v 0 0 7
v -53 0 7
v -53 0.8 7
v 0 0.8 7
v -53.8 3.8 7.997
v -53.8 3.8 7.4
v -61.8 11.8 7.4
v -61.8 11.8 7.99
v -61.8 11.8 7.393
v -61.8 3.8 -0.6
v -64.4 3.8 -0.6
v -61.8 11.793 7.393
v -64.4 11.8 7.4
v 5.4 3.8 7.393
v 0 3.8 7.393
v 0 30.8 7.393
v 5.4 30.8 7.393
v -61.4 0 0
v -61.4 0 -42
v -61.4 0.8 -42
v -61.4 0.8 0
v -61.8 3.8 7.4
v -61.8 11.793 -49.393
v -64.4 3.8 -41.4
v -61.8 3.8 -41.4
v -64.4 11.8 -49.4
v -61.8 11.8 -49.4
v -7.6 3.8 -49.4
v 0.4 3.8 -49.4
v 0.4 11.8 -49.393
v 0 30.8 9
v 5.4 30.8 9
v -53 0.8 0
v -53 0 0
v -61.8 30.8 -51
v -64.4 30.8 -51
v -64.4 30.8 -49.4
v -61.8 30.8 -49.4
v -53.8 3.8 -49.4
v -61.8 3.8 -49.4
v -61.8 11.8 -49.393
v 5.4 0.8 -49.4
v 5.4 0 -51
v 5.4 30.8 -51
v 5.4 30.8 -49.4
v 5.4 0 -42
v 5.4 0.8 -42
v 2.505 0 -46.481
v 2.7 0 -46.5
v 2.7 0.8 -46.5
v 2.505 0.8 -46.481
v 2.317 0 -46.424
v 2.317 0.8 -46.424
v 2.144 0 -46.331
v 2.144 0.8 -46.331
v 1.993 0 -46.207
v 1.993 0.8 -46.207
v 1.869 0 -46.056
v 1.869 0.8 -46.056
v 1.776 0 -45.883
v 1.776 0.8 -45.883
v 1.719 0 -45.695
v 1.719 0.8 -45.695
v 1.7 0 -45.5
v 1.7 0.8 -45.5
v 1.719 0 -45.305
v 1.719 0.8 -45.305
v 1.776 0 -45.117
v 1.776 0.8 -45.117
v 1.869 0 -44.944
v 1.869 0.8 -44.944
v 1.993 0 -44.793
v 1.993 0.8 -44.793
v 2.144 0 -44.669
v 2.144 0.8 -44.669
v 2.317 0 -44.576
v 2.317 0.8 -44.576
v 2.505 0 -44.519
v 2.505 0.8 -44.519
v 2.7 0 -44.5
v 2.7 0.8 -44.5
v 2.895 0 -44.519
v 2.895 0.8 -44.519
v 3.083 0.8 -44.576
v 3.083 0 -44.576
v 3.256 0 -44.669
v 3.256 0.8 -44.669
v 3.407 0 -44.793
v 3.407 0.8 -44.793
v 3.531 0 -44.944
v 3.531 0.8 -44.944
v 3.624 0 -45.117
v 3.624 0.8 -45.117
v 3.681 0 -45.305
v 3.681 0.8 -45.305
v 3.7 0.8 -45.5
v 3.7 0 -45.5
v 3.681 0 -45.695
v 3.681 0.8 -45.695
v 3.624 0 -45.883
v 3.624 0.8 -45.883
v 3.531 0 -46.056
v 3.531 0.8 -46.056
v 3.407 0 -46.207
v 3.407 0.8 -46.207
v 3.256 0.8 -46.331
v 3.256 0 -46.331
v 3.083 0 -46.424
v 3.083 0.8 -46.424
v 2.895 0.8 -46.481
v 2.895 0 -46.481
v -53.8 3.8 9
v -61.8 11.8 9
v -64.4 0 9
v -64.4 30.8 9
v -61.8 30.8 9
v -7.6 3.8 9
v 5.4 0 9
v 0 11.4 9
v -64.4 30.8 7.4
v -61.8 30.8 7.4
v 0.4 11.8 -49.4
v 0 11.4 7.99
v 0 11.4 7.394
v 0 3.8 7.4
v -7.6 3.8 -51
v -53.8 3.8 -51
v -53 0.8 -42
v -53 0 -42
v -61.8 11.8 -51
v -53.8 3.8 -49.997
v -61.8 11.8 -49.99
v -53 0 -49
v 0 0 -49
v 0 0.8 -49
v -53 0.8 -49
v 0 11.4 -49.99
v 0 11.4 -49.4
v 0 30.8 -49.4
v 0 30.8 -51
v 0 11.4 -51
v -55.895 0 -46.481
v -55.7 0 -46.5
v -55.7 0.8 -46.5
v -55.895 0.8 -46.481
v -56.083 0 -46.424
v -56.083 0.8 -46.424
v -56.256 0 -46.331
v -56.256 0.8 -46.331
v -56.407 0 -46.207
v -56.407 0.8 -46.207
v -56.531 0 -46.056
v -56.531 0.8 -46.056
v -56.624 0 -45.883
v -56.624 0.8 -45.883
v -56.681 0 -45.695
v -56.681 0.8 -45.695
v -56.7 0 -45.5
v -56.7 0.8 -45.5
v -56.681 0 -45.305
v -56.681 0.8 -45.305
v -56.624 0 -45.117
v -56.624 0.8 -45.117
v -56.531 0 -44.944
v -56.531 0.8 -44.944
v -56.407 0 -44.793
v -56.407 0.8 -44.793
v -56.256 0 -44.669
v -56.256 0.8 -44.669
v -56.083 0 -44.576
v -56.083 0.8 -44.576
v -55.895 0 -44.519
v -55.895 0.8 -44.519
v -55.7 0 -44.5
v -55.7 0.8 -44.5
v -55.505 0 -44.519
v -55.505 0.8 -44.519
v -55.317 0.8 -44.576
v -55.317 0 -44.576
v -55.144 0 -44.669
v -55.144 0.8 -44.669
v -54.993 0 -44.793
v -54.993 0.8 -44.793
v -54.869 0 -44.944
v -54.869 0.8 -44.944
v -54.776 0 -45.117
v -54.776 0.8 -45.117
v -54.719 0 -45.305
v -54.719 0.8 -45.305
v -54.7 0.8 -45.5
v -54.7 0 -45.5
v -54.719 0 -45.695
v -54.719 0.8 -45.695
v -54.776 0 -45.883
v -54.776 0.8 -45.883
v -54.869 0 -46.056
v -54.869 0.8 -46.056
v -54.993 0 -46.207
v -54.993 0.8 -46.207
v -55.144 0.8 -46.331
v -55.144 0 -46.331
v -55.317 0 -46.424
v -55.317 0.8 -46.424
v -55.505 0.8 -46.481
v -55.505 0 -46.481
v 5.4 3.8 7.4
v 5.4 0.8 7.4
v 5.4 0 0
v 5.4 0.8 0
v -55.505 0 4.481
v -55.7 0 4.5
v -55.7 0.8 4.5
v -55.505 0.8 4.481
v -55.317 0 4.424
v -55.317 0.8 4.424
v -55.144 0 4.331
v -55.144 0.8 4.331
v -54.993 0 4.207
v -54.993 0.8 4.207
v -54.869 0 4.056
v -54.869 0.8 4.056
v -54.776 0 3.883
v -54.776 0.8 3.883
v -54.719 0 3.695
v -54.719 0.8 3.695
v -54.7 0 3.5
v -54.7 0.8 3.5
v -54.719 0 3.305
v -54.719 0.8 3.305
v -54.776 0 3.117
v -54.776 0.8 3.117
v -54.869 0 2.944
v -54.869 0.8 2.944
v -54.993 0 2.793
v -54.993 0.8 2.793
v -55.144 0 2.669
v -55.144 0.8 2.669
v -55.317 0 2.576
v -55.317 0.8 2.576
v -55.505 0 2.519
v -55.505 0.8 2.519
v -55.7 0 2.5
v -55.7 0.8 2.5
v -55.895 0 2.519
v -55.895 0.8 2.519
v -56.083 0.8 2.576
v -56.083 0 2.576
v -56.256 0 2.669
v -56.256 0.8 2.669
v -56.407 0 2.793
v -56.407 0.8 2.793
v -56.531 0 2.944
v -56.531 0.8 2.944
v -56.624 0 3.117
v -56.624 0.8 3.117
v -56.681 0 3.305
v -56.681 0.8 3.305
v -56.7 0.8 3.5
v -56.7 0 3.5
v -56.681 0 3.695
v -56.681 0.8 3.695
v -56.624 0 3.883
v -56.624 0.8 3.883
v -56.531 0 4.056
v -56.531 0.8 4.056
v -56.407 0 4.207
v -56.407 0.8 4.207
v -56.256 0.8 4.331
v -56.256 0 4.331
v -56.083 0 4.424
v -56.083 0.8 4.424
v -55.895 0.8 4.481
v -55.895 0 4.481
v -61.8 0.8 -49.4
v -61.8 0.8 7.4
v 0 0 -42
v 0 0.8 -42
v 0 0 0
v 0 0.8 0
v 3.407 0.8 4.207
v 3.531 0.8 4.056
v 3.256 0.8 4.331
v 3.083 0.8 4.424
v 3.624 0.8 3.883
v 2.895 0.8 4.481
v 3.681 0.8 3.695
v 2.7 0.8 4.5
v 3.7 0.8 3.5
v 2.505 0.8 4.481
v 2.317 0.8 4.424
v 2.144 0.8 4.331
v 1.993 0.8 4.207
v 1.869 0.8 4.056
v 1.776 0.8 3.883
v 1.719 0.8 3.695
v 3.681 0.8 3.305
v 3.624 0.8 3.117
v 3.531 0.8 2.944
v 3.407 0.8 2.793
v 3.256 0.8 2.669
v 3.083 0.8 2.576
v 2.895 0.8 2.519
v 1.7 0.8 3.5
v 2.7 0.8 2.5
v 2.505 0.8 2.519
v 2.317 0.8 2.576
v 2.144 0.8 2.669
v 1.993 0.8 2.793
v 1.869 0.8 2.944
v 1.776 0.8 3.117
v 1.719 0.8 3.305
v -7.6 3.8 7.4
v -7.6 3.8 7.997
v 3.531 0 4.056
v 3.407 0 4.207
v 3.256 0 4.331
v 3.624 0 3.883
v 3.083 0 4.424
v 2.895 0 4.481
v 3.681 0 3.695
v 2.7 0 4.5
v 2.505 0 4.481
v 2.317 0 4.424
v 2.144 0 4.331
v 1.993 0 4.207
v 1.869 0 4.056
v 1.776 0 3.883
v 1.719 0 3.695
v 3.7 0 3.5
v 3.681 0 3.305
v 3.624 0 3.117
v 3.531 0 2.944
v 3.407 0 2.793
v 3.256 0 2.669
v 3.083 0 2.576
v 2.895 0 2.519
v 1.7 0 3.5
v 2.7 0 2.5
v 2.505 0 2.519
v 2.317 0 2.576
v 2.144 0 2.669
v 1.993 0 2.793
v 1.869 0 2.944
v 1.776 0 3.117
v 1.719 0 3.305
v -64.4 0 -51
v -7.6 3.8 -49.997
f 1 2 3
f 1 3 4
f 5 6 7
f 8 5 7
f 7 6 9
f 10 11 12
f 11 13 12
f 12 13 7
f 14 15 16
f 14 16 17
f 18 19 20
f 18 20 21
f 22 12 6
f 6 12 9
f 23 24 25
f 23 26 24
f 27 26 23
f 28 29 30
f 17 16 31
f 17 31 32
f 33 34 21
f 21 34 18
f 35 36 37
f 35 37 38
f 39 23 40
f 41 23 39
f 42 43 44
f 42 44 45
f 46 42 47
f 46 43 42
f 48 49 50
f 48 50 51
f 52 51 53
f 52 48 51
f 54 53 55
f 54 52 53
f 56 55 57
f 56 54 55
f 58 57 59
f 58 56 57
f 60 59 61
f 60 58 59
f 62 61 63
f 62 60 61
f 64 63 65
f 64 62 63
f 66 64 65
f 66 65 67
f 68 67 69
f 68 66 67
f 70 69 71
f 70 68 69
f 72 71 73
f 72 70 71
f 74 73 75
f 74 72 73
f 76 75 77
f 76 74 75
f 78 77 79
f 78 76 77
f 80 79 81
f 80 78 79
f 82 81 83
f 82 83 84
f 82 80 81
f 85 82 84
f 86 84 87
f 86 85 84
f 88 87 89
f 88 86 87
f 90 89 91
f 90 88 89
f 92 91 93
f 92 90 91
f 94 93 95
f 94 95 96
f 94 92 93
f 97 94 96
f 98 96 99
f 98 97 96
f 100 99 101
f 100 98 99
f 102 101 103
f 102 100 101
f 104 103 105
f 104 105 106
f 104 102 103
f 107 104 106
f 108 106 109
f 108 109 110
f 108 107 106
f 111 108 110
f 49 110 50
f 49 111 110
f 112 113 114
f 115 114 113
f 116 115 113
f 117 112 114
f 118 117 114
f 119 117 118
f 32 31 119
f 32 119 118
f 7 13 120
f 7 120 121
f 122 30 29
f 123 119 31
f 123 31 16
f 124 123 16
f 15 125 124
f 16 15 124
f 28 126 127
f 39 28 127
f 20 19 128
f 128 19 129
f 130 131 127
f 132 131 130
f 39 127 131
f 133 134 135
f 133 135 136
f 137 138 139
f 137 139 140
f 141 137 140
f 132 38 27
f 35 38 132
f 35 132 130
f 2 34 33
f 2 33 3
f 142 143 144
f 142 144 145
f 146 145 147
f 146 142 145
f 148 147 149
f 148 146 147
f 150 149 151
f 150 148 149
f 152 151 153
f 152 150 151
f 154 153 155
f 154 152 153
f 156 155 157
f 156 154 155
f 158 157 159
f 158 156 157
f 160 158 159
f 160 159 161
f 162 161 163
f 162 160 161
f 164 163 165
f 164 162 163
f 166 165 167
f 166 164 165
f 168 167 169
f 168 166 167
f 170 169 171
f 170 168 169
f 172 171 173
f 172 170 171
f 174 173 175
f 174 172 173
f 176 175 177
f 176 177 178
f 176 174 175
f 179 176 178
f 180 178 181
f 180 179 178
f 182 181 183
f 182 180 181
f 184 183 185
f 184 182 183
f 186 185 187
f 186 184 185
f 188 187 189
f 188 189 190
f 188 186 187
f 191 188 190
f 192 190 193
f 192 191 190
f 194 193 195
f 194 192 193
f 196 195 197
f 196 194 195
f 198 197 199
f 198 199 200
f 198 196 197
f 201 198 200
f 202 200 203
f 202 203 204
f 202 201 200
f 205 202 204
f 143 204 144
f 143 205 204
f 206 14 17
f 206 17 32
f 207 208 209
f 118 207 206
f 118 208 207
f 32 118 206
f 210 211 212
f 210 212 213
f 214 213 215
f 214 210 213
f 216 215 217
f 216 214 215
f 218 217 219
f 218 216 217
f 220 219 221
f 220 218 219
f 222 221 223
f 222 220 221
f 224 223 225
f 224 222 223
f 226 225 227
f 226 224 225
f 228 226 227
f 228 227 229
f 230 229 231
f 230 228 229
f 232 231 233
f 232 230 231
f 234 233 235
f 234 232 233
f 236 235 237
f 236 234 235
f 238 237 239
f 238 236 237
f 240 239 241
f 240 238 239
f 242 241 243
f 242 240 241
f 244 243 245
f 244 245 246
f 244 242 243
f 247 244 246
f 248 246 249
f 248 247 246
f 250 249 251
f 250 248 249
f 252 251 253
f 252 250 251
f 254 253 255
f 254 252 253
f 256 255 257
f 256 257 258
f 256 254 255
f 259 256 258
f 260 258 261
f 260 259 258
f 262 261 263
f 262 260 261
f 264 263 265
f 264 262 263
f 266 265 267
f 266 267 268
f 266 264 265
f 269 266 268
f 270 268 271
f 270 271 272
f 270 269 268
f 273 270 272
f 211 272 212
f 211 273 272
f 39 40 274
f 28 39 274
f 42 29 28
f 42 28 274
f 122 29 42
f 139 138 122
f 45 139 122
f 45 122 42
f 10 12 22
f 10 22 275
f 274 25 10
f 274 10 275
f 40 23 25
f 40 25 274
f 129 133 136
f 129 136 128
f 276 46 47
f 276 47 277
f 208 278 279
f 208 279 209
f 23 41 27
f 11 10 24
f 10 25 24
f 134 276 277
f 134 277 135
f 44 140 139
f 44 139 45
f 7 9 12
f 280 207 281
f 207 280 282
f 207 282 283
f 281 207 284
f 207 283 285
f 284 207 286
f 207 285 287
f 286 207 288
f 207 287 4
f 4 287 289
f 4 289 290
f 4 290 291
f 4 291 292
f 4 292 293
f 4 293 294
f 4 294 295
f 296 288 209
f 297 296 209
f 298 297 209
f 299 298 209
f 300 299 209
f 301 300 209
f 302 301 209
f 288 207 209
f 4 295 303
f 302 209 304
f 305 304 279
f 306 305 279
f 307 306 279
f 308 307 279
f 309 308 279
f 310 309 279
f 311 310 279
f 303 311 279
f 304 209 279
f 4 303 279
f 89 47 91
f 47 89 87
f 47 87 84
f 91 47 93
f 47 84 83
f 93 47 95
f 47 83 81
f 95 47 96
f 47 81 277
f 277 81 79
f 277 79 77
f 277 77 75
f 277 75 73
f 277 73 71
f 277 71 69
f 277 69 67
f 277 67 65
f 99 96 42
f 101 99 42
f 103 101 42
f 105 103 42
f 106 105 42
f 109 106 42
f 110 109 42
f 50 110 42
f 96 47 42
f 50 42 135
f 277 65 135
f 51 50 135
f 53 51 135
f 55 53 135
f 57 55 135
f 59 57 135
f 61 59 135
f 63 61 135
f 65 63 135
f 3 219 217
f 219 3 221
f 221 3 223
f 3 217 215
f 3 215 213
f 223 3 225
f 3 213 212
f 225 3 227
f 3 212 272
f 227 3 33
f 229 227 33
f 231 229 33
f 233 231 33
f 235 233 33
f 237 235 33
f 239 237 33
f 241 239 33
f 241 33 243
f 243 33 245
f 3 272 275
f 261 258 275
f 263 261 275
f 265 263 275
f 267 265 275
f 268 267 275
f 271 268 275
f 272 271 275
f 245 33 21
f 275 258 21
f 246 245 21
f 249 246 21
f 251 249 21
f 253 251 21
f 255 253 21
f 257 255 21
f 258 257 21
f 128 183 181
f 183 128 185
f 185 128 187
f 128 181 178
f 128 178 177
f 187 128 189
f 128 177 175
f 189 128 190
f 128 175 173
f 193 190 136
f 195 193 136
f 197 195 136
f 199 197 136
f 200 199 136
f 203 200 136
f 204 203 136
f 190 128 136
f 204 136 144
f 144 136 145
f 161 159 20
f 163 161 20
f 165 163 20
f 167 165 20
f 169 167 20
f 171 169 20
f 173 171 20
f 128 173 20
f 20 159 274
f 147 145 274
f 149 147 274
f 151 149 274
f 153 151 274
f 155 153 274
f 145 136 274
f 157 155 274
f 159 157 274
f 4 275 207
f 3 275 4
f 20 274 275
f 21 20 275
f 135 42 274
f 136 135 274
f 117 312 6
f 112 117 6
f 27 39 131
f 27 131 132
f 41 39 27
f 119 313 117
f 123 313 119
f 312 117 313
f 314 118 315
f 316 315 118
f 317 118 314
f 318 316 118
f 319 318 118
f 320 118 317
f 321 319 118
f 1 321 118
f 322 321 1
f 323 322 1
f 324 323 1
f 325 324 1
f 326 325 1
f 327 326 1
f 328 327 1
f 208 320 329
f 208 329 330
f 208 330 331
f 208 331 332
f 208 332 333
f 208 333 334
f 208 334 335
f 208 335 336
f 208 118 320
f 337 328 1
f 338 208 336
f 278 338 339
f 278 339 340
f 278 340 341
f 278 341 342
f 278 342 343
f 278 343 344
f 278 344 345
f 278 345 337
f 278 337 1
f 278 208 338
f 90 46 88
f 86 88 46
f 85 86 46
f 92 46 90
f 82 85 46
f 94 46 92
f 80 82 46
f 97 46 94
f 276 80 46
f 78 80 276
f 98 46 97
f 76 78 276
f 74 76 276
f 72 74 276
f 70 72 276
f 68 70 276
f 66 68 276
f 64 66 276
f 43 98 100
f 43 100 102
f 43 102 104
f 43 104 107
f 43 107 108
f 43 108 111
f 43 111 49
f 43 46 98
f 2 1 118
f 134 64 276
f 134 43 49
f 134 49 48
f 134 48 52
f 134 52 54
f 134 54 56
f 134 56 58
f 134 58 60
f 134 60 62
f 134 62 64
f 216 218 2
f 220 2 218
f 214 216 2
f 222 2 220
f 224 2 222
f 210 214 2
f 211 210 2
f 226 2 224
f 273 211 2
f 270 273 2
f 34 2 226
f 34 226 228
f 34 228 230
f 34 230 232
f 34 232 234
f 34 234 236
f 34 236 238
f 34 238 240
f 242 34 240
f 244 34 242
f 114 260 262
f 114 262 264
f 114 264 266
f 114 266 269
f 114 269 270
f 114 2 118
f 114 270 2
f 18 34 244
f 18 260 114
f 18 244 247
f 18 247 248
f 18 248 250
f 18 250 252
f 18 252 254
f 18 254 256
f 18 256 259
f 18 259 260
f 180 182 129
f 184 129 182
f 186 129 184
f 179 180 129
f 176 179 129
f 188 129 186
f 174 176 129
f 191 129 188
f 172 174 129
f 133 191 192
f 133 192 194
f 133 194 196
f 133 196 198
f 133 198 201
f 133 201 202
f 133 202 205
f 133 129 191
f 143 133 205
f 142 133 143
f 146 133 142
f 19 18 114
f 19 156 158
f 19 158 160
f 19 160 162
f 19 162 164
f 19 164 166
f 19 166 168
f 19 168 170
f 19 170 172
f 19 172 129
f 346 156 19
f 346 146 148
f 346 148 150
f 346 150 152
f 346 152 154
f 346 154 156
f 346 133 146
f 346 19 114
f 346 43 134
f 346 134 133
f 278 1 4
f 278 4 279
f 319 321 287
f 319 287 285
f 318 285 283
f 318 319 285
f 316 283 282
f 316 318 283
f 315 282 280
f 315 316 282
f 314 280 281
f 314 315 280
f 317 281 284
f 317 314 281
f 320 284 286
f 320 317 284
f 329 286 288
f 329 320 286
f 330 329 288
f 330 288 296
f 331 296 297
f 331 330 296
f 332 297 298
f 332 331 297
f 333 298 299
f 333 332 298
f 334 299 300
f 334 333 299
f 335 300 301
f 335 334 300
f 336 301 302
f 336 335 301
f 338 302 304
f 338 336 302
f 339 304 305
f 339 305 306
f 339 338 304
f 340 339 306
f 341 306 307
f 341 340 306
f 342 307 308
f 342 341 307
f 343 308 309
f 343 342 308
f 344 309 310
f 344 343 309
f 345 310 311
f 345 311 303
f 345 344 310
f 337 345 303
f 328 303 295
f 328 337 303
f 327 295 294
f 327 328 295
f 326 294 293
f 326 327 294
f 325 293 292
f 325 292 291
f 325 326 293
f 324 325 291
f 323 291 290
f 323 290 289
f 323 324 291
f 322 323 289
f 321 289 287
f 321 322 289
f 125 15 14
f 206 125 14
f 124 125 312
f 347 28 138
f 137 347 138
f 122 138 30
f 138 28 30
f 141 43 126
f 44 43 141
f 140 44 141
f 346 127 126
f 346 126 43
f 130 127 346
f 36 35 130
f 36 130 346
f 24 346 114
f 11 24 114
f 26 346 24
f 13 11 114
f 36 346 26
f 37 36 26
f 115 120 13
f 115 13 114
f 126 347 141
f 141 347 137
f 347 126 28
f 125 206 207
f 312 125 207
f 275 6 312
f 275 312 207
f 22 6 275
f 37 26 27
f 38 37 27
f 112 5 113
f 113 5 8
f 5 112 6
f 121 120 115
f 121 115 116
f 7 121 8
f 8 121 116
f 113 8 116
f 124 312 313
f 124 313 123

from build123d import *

# Parameters (mm, degrees)
SKETCH1_R            = 0.9999999999999983
SKETCH1_R_2          = 1.0000000000000002
SKETCH1_R_3          = 1.0000000000000013
BOSS_EXTRUDE1_DEPTH  = 0.8
BOSS_EXTRUDE2_DEPTH  = 3
SKETCH3_W            = 2.6000000000000014
SKETCH3_H            = 1.6000000000000156
SKETCH3_W_2          = 5.400000000000002
SKETCH3_H_2          = 1.6066889909461715
SKETCH3_H_3          = 1.6000000000000094
BOSS_EXTRUDE3_DEPTH  = 27
LOFT4_START          = 7.4
LOFT4_DEPTH          = 1.6
LOFT4_START_2        = 7.403174683
LOFT4_2_DEPTH        = 0.596825317
MIRROR6_START        = 7.4
MIRROR6_COPY_1_DEPTH = 1.6
MIRROR6_START_2      = 7.403174683
MIRROR6_COPY_2_DEPTH = 0.596825317
MIRROR6_COPY_3_DEPTH = 1.6
MIRROR6_COPY_4_DEPTH = 0.596825317


with BuildPart() as part:
    # Sketch1 → Boss-Extrude1 (new body)
    with BuildSketch(Plane(origin=(0, 0, 0), x_dir=(1, 0, 0), z_dir=(0, 1, 0))):
        Polygon((0, 0), (5.4, 0), (5.400000000000007, -7.000000000000003), (5.400000000000002, -8.999999999999995), (-58.4, -8.999999999999995), (-61.40000000000001, -8.999999999999995), (-64.4, -8.999999999999995), (-64.4, 51), (-61.40000000000001, 51), (-58.4, 51), (5.400000000000004, 50.99999999999999), (5.400000000000004, 48.99999999999999), (5.4, 42.00000000000001), (0, 41.99999999999999), (-6.07e-15, 48.99999999999999), (-53.00000000000001, 48.99999999999999), (-53.00000000000001, 41.99999999999999), (-58.400000000000006, 41.99999999999999), (-61.40000000000001, 41.99999999999999), (-61.40000000000001, 0), (-58.400000000000006, 0), (-53.00000000000001, -1.73e-15), (-53.00000000000001, -6.999999999999986), (-6.14e-15, -6.999999999999999), align=None)
        with Locations(Location((-55.70000000000001, -3.4999999999999885, 0), (0, 0, 270))):
            Circle(SKETCH1_R, mode=Mode.SUBTRACT)
        with Locations(Location((2.700000000000006, -3.499999999999999, 0), (0, 0, 270))):
            Circle(SKETCH1_R_2, mode=Mode.SUBTRACT)
        with Locations(Location((2.7000000000000015, 45.5, 0), (0, 0, 90))):
            Circle(SKETCH1_R_3, mode=Mode.SUBTRACT)
        with Locations(Location((-55.7, 45.5, 0), (0, 0, 90))):
            Circle(SKETCH1_R, mode=Mode.SUBTRACT)
    extrude(amount=BOSS_EXTRUDE1_DEPTH)

    # Sketch2 → Boss-Extrude2 (add)
    with BuildSketch(Plane(origin=(0, 0.8, 0), x_dir=(1, 0, 0), z_dir=(0, 1, 0))):
        Polygon((-64.4, 51), (5.400000000000002, 51), (5.400000000000002, 49.39999999999999), (-61.800000000000004, 49.39999999999999), (-61.800000000000004, -7.399999999999985), (5.400000000000009, -7.399999999999985), (5.400000000000002, -8.999999999999995), (-64.4, -8.999999999999995), align=None)
    extrude(amount=BOSS_EXTRUDE2_DEPTH)

    # Sketch3 → Boss-Extrude3 (add)
    with BuildSketch(Plane(origin=(0, 3.8, 0), x_dir=(1, 0, 0), z_dir=(0, 1, 0))):
        with Locations((-63.10000000000001, 50.2)):
            Rectangle(SKETCH3_W, SKETCH3_H)
        with Locations((2.700000000000001, 50.2)):
            Rectangle(SKETCH3_W_2, SKETCH3_H)
        with Locations((2.700000000000001, -8.196655504526909)):
            Rectangle(SKETCH3_W_2, SKETCH3_H_2)
        with Locations((-63.10000000000001, -8.19999999999999)):
            Rectangle(SKETCH3_W, SKETCH3_H_3)
    extrude(amount=BOSS_EXTRUDE3_DEPTH)

    # Sketch9 → Loft3 section 0
    with BuildSketch(Plane(origin=(0, 3.8, 0), x_dir=(1, 0, 0), z_dir=(0, 1, 0))):
        with BuildLine():
            Line((-64.4, -7.399999999999985), (-64.4, 0.6000000000000146))
            Line((-64.4, 0.6000000000000146), (-61.800000000000004, 0.6000000000000149))
            Line((-61.800000000000004, 0.6000000000000149), (-61.800000000000004, -7.399999999999985))
            Line((-61.800000000000004, -7.399999999999985), (-64.4, -7.399999999999985))
        make_face()
    # Sketch7 → Loft3 section 1
    with BuildSketch(Plane(origin=(0, 0, 7.399999999999985), x_dir=(-1, 0, -3.903e-14), z_dir=(3.903e-14, 0, -1))):
        with BuildLine():
            Line((64.40000000000235, 3.8), (64.4000000000023, 11.799999999999999))
            Line((64.4000000000023, 11.799999999999999), (61.80000000000229, 11.799999999999997))
            Line((61.80000000000229, 11.799999999999997), (61.80000000000229, 3.8))
            Line((61.80000000000229, 3.8), (64.40000000000235, 3.8))
        make_face()
    loft3 = loft()

    # Loft4: read off the stored shape, not the designer's step
    # Loft4 outline → Loft4 (add)
    with BuildSketch(Plane.XY.offset(LOFT4_START)):
        Polygon((-61.8, 11.8), (-61.8, 3.8), (-53.8, 3.8), align=None)
    loft4 = extrude(amount=LOFT4_DEPTH)

    # Loft4 2 outline → Loft4 2 (add)
    with BuildSketch(Plane(origin=(0, 0, 0), x_dir=(1, 0, 0), z_dir=(0, 0.0008361235760020348, 0.9999996504486218)).offset(LOFT4_START_2)):
        Polygon((-61.8, 11.793814154), (-61.8, 3.793811357), (-53.8, 3.793811357), align=None)
    loft4_2 = extrude(amount=LOFT4_2_DEPTH)

    # Mirror4: Loft3, Loft4, Loft4 2 across plane
    add(loft3.mirror(Plane.XY.offset(-20.999999999999993)))
    add(loft4.mirror(Plane.XY.offset(-20.999999999999993)))
    add(loft4_2.mirror(Plane.XY.offset(-20.999999999999993)))

    # Mirror5: Loft4, Loft4 2 across plane
    add(loft4.mirror(Plane(origin=(-30.700000000000014, 0, 0), x_dir=(0, 0, 1), z_dir=(1, 0, 0))))
    add(loft4_2.mirror(Plane(origin=(-30.700000000000014, 0, 0), x_dir=(0, 0, 1), z_dir=(1, 0, 0))))

    # Mirror6 copy 1 sketch → Mirror6 copy 1 (add)
    with BuildSketch(Plane(origin=(-61.40000000000003, 0, -41.999999999999986), x_dir=(-1, 0, 0), z_dir=(0, 0, -1)).offset(MIRROR6_START)):
        Polygon((-61.8, 11.8), (-61.8, 3.8), (-53.8, 3.8), align=None)
    extrude(amount=MIRROR6_COPY_1_DEPTH)

    # Mirror6 copy 2 sketch → Mirror6 copy 2 (add)
    with BuildSketch(Plane(origin=(-61.40000000000003, 0, -41.999999999999986), x_dir=(-1, 0, 0), z_dir=(0, 0.0008361235760020348, -0.9999996504486218)).offset(MIRROR6_START_2)):
        Polygon((-61.8, 11.793814154), (-61.8, 3.793811357), (-53.8, 3.793811357), align=None)
    extrude(amount=MIRROR6_COPY_2_DEPTH)

    # Mirror6 copy 3 sketch → Mirror6 copy 3 (add)
    with BuildSketch(Plane(origin=(0, 0, -41.999999999999986), x_dir=(1, 0, 0), z_dir=(0, 0, -1)).offset(MIRROR6_START)):
        Polygon((-61.8, -11.8), (-61.8, -3.8), (-53.8, -3.8), align=None)
    extrude(amount=MIRROR6_COPY_3_DEPTH)

    # Mirror6 copy 4 sketch → Mirror6 copy 4 (add)
    with BuildSketch(Plane(origin=(0, 0, -41.999999999999986), x_dir=(1, 0, 0), z_dir=(0, 0.0008361235760020348, -0.9999996504486218)).offset(MIRROR6_START_2)):
        Polygon((-61.8, -11.793814154), (-61.8, -3.793811357), (-53.8, -3.793811357), align=None)
    extrude(amount=MIRROR6_COPY_4_DEPTH)


solid = part.part
